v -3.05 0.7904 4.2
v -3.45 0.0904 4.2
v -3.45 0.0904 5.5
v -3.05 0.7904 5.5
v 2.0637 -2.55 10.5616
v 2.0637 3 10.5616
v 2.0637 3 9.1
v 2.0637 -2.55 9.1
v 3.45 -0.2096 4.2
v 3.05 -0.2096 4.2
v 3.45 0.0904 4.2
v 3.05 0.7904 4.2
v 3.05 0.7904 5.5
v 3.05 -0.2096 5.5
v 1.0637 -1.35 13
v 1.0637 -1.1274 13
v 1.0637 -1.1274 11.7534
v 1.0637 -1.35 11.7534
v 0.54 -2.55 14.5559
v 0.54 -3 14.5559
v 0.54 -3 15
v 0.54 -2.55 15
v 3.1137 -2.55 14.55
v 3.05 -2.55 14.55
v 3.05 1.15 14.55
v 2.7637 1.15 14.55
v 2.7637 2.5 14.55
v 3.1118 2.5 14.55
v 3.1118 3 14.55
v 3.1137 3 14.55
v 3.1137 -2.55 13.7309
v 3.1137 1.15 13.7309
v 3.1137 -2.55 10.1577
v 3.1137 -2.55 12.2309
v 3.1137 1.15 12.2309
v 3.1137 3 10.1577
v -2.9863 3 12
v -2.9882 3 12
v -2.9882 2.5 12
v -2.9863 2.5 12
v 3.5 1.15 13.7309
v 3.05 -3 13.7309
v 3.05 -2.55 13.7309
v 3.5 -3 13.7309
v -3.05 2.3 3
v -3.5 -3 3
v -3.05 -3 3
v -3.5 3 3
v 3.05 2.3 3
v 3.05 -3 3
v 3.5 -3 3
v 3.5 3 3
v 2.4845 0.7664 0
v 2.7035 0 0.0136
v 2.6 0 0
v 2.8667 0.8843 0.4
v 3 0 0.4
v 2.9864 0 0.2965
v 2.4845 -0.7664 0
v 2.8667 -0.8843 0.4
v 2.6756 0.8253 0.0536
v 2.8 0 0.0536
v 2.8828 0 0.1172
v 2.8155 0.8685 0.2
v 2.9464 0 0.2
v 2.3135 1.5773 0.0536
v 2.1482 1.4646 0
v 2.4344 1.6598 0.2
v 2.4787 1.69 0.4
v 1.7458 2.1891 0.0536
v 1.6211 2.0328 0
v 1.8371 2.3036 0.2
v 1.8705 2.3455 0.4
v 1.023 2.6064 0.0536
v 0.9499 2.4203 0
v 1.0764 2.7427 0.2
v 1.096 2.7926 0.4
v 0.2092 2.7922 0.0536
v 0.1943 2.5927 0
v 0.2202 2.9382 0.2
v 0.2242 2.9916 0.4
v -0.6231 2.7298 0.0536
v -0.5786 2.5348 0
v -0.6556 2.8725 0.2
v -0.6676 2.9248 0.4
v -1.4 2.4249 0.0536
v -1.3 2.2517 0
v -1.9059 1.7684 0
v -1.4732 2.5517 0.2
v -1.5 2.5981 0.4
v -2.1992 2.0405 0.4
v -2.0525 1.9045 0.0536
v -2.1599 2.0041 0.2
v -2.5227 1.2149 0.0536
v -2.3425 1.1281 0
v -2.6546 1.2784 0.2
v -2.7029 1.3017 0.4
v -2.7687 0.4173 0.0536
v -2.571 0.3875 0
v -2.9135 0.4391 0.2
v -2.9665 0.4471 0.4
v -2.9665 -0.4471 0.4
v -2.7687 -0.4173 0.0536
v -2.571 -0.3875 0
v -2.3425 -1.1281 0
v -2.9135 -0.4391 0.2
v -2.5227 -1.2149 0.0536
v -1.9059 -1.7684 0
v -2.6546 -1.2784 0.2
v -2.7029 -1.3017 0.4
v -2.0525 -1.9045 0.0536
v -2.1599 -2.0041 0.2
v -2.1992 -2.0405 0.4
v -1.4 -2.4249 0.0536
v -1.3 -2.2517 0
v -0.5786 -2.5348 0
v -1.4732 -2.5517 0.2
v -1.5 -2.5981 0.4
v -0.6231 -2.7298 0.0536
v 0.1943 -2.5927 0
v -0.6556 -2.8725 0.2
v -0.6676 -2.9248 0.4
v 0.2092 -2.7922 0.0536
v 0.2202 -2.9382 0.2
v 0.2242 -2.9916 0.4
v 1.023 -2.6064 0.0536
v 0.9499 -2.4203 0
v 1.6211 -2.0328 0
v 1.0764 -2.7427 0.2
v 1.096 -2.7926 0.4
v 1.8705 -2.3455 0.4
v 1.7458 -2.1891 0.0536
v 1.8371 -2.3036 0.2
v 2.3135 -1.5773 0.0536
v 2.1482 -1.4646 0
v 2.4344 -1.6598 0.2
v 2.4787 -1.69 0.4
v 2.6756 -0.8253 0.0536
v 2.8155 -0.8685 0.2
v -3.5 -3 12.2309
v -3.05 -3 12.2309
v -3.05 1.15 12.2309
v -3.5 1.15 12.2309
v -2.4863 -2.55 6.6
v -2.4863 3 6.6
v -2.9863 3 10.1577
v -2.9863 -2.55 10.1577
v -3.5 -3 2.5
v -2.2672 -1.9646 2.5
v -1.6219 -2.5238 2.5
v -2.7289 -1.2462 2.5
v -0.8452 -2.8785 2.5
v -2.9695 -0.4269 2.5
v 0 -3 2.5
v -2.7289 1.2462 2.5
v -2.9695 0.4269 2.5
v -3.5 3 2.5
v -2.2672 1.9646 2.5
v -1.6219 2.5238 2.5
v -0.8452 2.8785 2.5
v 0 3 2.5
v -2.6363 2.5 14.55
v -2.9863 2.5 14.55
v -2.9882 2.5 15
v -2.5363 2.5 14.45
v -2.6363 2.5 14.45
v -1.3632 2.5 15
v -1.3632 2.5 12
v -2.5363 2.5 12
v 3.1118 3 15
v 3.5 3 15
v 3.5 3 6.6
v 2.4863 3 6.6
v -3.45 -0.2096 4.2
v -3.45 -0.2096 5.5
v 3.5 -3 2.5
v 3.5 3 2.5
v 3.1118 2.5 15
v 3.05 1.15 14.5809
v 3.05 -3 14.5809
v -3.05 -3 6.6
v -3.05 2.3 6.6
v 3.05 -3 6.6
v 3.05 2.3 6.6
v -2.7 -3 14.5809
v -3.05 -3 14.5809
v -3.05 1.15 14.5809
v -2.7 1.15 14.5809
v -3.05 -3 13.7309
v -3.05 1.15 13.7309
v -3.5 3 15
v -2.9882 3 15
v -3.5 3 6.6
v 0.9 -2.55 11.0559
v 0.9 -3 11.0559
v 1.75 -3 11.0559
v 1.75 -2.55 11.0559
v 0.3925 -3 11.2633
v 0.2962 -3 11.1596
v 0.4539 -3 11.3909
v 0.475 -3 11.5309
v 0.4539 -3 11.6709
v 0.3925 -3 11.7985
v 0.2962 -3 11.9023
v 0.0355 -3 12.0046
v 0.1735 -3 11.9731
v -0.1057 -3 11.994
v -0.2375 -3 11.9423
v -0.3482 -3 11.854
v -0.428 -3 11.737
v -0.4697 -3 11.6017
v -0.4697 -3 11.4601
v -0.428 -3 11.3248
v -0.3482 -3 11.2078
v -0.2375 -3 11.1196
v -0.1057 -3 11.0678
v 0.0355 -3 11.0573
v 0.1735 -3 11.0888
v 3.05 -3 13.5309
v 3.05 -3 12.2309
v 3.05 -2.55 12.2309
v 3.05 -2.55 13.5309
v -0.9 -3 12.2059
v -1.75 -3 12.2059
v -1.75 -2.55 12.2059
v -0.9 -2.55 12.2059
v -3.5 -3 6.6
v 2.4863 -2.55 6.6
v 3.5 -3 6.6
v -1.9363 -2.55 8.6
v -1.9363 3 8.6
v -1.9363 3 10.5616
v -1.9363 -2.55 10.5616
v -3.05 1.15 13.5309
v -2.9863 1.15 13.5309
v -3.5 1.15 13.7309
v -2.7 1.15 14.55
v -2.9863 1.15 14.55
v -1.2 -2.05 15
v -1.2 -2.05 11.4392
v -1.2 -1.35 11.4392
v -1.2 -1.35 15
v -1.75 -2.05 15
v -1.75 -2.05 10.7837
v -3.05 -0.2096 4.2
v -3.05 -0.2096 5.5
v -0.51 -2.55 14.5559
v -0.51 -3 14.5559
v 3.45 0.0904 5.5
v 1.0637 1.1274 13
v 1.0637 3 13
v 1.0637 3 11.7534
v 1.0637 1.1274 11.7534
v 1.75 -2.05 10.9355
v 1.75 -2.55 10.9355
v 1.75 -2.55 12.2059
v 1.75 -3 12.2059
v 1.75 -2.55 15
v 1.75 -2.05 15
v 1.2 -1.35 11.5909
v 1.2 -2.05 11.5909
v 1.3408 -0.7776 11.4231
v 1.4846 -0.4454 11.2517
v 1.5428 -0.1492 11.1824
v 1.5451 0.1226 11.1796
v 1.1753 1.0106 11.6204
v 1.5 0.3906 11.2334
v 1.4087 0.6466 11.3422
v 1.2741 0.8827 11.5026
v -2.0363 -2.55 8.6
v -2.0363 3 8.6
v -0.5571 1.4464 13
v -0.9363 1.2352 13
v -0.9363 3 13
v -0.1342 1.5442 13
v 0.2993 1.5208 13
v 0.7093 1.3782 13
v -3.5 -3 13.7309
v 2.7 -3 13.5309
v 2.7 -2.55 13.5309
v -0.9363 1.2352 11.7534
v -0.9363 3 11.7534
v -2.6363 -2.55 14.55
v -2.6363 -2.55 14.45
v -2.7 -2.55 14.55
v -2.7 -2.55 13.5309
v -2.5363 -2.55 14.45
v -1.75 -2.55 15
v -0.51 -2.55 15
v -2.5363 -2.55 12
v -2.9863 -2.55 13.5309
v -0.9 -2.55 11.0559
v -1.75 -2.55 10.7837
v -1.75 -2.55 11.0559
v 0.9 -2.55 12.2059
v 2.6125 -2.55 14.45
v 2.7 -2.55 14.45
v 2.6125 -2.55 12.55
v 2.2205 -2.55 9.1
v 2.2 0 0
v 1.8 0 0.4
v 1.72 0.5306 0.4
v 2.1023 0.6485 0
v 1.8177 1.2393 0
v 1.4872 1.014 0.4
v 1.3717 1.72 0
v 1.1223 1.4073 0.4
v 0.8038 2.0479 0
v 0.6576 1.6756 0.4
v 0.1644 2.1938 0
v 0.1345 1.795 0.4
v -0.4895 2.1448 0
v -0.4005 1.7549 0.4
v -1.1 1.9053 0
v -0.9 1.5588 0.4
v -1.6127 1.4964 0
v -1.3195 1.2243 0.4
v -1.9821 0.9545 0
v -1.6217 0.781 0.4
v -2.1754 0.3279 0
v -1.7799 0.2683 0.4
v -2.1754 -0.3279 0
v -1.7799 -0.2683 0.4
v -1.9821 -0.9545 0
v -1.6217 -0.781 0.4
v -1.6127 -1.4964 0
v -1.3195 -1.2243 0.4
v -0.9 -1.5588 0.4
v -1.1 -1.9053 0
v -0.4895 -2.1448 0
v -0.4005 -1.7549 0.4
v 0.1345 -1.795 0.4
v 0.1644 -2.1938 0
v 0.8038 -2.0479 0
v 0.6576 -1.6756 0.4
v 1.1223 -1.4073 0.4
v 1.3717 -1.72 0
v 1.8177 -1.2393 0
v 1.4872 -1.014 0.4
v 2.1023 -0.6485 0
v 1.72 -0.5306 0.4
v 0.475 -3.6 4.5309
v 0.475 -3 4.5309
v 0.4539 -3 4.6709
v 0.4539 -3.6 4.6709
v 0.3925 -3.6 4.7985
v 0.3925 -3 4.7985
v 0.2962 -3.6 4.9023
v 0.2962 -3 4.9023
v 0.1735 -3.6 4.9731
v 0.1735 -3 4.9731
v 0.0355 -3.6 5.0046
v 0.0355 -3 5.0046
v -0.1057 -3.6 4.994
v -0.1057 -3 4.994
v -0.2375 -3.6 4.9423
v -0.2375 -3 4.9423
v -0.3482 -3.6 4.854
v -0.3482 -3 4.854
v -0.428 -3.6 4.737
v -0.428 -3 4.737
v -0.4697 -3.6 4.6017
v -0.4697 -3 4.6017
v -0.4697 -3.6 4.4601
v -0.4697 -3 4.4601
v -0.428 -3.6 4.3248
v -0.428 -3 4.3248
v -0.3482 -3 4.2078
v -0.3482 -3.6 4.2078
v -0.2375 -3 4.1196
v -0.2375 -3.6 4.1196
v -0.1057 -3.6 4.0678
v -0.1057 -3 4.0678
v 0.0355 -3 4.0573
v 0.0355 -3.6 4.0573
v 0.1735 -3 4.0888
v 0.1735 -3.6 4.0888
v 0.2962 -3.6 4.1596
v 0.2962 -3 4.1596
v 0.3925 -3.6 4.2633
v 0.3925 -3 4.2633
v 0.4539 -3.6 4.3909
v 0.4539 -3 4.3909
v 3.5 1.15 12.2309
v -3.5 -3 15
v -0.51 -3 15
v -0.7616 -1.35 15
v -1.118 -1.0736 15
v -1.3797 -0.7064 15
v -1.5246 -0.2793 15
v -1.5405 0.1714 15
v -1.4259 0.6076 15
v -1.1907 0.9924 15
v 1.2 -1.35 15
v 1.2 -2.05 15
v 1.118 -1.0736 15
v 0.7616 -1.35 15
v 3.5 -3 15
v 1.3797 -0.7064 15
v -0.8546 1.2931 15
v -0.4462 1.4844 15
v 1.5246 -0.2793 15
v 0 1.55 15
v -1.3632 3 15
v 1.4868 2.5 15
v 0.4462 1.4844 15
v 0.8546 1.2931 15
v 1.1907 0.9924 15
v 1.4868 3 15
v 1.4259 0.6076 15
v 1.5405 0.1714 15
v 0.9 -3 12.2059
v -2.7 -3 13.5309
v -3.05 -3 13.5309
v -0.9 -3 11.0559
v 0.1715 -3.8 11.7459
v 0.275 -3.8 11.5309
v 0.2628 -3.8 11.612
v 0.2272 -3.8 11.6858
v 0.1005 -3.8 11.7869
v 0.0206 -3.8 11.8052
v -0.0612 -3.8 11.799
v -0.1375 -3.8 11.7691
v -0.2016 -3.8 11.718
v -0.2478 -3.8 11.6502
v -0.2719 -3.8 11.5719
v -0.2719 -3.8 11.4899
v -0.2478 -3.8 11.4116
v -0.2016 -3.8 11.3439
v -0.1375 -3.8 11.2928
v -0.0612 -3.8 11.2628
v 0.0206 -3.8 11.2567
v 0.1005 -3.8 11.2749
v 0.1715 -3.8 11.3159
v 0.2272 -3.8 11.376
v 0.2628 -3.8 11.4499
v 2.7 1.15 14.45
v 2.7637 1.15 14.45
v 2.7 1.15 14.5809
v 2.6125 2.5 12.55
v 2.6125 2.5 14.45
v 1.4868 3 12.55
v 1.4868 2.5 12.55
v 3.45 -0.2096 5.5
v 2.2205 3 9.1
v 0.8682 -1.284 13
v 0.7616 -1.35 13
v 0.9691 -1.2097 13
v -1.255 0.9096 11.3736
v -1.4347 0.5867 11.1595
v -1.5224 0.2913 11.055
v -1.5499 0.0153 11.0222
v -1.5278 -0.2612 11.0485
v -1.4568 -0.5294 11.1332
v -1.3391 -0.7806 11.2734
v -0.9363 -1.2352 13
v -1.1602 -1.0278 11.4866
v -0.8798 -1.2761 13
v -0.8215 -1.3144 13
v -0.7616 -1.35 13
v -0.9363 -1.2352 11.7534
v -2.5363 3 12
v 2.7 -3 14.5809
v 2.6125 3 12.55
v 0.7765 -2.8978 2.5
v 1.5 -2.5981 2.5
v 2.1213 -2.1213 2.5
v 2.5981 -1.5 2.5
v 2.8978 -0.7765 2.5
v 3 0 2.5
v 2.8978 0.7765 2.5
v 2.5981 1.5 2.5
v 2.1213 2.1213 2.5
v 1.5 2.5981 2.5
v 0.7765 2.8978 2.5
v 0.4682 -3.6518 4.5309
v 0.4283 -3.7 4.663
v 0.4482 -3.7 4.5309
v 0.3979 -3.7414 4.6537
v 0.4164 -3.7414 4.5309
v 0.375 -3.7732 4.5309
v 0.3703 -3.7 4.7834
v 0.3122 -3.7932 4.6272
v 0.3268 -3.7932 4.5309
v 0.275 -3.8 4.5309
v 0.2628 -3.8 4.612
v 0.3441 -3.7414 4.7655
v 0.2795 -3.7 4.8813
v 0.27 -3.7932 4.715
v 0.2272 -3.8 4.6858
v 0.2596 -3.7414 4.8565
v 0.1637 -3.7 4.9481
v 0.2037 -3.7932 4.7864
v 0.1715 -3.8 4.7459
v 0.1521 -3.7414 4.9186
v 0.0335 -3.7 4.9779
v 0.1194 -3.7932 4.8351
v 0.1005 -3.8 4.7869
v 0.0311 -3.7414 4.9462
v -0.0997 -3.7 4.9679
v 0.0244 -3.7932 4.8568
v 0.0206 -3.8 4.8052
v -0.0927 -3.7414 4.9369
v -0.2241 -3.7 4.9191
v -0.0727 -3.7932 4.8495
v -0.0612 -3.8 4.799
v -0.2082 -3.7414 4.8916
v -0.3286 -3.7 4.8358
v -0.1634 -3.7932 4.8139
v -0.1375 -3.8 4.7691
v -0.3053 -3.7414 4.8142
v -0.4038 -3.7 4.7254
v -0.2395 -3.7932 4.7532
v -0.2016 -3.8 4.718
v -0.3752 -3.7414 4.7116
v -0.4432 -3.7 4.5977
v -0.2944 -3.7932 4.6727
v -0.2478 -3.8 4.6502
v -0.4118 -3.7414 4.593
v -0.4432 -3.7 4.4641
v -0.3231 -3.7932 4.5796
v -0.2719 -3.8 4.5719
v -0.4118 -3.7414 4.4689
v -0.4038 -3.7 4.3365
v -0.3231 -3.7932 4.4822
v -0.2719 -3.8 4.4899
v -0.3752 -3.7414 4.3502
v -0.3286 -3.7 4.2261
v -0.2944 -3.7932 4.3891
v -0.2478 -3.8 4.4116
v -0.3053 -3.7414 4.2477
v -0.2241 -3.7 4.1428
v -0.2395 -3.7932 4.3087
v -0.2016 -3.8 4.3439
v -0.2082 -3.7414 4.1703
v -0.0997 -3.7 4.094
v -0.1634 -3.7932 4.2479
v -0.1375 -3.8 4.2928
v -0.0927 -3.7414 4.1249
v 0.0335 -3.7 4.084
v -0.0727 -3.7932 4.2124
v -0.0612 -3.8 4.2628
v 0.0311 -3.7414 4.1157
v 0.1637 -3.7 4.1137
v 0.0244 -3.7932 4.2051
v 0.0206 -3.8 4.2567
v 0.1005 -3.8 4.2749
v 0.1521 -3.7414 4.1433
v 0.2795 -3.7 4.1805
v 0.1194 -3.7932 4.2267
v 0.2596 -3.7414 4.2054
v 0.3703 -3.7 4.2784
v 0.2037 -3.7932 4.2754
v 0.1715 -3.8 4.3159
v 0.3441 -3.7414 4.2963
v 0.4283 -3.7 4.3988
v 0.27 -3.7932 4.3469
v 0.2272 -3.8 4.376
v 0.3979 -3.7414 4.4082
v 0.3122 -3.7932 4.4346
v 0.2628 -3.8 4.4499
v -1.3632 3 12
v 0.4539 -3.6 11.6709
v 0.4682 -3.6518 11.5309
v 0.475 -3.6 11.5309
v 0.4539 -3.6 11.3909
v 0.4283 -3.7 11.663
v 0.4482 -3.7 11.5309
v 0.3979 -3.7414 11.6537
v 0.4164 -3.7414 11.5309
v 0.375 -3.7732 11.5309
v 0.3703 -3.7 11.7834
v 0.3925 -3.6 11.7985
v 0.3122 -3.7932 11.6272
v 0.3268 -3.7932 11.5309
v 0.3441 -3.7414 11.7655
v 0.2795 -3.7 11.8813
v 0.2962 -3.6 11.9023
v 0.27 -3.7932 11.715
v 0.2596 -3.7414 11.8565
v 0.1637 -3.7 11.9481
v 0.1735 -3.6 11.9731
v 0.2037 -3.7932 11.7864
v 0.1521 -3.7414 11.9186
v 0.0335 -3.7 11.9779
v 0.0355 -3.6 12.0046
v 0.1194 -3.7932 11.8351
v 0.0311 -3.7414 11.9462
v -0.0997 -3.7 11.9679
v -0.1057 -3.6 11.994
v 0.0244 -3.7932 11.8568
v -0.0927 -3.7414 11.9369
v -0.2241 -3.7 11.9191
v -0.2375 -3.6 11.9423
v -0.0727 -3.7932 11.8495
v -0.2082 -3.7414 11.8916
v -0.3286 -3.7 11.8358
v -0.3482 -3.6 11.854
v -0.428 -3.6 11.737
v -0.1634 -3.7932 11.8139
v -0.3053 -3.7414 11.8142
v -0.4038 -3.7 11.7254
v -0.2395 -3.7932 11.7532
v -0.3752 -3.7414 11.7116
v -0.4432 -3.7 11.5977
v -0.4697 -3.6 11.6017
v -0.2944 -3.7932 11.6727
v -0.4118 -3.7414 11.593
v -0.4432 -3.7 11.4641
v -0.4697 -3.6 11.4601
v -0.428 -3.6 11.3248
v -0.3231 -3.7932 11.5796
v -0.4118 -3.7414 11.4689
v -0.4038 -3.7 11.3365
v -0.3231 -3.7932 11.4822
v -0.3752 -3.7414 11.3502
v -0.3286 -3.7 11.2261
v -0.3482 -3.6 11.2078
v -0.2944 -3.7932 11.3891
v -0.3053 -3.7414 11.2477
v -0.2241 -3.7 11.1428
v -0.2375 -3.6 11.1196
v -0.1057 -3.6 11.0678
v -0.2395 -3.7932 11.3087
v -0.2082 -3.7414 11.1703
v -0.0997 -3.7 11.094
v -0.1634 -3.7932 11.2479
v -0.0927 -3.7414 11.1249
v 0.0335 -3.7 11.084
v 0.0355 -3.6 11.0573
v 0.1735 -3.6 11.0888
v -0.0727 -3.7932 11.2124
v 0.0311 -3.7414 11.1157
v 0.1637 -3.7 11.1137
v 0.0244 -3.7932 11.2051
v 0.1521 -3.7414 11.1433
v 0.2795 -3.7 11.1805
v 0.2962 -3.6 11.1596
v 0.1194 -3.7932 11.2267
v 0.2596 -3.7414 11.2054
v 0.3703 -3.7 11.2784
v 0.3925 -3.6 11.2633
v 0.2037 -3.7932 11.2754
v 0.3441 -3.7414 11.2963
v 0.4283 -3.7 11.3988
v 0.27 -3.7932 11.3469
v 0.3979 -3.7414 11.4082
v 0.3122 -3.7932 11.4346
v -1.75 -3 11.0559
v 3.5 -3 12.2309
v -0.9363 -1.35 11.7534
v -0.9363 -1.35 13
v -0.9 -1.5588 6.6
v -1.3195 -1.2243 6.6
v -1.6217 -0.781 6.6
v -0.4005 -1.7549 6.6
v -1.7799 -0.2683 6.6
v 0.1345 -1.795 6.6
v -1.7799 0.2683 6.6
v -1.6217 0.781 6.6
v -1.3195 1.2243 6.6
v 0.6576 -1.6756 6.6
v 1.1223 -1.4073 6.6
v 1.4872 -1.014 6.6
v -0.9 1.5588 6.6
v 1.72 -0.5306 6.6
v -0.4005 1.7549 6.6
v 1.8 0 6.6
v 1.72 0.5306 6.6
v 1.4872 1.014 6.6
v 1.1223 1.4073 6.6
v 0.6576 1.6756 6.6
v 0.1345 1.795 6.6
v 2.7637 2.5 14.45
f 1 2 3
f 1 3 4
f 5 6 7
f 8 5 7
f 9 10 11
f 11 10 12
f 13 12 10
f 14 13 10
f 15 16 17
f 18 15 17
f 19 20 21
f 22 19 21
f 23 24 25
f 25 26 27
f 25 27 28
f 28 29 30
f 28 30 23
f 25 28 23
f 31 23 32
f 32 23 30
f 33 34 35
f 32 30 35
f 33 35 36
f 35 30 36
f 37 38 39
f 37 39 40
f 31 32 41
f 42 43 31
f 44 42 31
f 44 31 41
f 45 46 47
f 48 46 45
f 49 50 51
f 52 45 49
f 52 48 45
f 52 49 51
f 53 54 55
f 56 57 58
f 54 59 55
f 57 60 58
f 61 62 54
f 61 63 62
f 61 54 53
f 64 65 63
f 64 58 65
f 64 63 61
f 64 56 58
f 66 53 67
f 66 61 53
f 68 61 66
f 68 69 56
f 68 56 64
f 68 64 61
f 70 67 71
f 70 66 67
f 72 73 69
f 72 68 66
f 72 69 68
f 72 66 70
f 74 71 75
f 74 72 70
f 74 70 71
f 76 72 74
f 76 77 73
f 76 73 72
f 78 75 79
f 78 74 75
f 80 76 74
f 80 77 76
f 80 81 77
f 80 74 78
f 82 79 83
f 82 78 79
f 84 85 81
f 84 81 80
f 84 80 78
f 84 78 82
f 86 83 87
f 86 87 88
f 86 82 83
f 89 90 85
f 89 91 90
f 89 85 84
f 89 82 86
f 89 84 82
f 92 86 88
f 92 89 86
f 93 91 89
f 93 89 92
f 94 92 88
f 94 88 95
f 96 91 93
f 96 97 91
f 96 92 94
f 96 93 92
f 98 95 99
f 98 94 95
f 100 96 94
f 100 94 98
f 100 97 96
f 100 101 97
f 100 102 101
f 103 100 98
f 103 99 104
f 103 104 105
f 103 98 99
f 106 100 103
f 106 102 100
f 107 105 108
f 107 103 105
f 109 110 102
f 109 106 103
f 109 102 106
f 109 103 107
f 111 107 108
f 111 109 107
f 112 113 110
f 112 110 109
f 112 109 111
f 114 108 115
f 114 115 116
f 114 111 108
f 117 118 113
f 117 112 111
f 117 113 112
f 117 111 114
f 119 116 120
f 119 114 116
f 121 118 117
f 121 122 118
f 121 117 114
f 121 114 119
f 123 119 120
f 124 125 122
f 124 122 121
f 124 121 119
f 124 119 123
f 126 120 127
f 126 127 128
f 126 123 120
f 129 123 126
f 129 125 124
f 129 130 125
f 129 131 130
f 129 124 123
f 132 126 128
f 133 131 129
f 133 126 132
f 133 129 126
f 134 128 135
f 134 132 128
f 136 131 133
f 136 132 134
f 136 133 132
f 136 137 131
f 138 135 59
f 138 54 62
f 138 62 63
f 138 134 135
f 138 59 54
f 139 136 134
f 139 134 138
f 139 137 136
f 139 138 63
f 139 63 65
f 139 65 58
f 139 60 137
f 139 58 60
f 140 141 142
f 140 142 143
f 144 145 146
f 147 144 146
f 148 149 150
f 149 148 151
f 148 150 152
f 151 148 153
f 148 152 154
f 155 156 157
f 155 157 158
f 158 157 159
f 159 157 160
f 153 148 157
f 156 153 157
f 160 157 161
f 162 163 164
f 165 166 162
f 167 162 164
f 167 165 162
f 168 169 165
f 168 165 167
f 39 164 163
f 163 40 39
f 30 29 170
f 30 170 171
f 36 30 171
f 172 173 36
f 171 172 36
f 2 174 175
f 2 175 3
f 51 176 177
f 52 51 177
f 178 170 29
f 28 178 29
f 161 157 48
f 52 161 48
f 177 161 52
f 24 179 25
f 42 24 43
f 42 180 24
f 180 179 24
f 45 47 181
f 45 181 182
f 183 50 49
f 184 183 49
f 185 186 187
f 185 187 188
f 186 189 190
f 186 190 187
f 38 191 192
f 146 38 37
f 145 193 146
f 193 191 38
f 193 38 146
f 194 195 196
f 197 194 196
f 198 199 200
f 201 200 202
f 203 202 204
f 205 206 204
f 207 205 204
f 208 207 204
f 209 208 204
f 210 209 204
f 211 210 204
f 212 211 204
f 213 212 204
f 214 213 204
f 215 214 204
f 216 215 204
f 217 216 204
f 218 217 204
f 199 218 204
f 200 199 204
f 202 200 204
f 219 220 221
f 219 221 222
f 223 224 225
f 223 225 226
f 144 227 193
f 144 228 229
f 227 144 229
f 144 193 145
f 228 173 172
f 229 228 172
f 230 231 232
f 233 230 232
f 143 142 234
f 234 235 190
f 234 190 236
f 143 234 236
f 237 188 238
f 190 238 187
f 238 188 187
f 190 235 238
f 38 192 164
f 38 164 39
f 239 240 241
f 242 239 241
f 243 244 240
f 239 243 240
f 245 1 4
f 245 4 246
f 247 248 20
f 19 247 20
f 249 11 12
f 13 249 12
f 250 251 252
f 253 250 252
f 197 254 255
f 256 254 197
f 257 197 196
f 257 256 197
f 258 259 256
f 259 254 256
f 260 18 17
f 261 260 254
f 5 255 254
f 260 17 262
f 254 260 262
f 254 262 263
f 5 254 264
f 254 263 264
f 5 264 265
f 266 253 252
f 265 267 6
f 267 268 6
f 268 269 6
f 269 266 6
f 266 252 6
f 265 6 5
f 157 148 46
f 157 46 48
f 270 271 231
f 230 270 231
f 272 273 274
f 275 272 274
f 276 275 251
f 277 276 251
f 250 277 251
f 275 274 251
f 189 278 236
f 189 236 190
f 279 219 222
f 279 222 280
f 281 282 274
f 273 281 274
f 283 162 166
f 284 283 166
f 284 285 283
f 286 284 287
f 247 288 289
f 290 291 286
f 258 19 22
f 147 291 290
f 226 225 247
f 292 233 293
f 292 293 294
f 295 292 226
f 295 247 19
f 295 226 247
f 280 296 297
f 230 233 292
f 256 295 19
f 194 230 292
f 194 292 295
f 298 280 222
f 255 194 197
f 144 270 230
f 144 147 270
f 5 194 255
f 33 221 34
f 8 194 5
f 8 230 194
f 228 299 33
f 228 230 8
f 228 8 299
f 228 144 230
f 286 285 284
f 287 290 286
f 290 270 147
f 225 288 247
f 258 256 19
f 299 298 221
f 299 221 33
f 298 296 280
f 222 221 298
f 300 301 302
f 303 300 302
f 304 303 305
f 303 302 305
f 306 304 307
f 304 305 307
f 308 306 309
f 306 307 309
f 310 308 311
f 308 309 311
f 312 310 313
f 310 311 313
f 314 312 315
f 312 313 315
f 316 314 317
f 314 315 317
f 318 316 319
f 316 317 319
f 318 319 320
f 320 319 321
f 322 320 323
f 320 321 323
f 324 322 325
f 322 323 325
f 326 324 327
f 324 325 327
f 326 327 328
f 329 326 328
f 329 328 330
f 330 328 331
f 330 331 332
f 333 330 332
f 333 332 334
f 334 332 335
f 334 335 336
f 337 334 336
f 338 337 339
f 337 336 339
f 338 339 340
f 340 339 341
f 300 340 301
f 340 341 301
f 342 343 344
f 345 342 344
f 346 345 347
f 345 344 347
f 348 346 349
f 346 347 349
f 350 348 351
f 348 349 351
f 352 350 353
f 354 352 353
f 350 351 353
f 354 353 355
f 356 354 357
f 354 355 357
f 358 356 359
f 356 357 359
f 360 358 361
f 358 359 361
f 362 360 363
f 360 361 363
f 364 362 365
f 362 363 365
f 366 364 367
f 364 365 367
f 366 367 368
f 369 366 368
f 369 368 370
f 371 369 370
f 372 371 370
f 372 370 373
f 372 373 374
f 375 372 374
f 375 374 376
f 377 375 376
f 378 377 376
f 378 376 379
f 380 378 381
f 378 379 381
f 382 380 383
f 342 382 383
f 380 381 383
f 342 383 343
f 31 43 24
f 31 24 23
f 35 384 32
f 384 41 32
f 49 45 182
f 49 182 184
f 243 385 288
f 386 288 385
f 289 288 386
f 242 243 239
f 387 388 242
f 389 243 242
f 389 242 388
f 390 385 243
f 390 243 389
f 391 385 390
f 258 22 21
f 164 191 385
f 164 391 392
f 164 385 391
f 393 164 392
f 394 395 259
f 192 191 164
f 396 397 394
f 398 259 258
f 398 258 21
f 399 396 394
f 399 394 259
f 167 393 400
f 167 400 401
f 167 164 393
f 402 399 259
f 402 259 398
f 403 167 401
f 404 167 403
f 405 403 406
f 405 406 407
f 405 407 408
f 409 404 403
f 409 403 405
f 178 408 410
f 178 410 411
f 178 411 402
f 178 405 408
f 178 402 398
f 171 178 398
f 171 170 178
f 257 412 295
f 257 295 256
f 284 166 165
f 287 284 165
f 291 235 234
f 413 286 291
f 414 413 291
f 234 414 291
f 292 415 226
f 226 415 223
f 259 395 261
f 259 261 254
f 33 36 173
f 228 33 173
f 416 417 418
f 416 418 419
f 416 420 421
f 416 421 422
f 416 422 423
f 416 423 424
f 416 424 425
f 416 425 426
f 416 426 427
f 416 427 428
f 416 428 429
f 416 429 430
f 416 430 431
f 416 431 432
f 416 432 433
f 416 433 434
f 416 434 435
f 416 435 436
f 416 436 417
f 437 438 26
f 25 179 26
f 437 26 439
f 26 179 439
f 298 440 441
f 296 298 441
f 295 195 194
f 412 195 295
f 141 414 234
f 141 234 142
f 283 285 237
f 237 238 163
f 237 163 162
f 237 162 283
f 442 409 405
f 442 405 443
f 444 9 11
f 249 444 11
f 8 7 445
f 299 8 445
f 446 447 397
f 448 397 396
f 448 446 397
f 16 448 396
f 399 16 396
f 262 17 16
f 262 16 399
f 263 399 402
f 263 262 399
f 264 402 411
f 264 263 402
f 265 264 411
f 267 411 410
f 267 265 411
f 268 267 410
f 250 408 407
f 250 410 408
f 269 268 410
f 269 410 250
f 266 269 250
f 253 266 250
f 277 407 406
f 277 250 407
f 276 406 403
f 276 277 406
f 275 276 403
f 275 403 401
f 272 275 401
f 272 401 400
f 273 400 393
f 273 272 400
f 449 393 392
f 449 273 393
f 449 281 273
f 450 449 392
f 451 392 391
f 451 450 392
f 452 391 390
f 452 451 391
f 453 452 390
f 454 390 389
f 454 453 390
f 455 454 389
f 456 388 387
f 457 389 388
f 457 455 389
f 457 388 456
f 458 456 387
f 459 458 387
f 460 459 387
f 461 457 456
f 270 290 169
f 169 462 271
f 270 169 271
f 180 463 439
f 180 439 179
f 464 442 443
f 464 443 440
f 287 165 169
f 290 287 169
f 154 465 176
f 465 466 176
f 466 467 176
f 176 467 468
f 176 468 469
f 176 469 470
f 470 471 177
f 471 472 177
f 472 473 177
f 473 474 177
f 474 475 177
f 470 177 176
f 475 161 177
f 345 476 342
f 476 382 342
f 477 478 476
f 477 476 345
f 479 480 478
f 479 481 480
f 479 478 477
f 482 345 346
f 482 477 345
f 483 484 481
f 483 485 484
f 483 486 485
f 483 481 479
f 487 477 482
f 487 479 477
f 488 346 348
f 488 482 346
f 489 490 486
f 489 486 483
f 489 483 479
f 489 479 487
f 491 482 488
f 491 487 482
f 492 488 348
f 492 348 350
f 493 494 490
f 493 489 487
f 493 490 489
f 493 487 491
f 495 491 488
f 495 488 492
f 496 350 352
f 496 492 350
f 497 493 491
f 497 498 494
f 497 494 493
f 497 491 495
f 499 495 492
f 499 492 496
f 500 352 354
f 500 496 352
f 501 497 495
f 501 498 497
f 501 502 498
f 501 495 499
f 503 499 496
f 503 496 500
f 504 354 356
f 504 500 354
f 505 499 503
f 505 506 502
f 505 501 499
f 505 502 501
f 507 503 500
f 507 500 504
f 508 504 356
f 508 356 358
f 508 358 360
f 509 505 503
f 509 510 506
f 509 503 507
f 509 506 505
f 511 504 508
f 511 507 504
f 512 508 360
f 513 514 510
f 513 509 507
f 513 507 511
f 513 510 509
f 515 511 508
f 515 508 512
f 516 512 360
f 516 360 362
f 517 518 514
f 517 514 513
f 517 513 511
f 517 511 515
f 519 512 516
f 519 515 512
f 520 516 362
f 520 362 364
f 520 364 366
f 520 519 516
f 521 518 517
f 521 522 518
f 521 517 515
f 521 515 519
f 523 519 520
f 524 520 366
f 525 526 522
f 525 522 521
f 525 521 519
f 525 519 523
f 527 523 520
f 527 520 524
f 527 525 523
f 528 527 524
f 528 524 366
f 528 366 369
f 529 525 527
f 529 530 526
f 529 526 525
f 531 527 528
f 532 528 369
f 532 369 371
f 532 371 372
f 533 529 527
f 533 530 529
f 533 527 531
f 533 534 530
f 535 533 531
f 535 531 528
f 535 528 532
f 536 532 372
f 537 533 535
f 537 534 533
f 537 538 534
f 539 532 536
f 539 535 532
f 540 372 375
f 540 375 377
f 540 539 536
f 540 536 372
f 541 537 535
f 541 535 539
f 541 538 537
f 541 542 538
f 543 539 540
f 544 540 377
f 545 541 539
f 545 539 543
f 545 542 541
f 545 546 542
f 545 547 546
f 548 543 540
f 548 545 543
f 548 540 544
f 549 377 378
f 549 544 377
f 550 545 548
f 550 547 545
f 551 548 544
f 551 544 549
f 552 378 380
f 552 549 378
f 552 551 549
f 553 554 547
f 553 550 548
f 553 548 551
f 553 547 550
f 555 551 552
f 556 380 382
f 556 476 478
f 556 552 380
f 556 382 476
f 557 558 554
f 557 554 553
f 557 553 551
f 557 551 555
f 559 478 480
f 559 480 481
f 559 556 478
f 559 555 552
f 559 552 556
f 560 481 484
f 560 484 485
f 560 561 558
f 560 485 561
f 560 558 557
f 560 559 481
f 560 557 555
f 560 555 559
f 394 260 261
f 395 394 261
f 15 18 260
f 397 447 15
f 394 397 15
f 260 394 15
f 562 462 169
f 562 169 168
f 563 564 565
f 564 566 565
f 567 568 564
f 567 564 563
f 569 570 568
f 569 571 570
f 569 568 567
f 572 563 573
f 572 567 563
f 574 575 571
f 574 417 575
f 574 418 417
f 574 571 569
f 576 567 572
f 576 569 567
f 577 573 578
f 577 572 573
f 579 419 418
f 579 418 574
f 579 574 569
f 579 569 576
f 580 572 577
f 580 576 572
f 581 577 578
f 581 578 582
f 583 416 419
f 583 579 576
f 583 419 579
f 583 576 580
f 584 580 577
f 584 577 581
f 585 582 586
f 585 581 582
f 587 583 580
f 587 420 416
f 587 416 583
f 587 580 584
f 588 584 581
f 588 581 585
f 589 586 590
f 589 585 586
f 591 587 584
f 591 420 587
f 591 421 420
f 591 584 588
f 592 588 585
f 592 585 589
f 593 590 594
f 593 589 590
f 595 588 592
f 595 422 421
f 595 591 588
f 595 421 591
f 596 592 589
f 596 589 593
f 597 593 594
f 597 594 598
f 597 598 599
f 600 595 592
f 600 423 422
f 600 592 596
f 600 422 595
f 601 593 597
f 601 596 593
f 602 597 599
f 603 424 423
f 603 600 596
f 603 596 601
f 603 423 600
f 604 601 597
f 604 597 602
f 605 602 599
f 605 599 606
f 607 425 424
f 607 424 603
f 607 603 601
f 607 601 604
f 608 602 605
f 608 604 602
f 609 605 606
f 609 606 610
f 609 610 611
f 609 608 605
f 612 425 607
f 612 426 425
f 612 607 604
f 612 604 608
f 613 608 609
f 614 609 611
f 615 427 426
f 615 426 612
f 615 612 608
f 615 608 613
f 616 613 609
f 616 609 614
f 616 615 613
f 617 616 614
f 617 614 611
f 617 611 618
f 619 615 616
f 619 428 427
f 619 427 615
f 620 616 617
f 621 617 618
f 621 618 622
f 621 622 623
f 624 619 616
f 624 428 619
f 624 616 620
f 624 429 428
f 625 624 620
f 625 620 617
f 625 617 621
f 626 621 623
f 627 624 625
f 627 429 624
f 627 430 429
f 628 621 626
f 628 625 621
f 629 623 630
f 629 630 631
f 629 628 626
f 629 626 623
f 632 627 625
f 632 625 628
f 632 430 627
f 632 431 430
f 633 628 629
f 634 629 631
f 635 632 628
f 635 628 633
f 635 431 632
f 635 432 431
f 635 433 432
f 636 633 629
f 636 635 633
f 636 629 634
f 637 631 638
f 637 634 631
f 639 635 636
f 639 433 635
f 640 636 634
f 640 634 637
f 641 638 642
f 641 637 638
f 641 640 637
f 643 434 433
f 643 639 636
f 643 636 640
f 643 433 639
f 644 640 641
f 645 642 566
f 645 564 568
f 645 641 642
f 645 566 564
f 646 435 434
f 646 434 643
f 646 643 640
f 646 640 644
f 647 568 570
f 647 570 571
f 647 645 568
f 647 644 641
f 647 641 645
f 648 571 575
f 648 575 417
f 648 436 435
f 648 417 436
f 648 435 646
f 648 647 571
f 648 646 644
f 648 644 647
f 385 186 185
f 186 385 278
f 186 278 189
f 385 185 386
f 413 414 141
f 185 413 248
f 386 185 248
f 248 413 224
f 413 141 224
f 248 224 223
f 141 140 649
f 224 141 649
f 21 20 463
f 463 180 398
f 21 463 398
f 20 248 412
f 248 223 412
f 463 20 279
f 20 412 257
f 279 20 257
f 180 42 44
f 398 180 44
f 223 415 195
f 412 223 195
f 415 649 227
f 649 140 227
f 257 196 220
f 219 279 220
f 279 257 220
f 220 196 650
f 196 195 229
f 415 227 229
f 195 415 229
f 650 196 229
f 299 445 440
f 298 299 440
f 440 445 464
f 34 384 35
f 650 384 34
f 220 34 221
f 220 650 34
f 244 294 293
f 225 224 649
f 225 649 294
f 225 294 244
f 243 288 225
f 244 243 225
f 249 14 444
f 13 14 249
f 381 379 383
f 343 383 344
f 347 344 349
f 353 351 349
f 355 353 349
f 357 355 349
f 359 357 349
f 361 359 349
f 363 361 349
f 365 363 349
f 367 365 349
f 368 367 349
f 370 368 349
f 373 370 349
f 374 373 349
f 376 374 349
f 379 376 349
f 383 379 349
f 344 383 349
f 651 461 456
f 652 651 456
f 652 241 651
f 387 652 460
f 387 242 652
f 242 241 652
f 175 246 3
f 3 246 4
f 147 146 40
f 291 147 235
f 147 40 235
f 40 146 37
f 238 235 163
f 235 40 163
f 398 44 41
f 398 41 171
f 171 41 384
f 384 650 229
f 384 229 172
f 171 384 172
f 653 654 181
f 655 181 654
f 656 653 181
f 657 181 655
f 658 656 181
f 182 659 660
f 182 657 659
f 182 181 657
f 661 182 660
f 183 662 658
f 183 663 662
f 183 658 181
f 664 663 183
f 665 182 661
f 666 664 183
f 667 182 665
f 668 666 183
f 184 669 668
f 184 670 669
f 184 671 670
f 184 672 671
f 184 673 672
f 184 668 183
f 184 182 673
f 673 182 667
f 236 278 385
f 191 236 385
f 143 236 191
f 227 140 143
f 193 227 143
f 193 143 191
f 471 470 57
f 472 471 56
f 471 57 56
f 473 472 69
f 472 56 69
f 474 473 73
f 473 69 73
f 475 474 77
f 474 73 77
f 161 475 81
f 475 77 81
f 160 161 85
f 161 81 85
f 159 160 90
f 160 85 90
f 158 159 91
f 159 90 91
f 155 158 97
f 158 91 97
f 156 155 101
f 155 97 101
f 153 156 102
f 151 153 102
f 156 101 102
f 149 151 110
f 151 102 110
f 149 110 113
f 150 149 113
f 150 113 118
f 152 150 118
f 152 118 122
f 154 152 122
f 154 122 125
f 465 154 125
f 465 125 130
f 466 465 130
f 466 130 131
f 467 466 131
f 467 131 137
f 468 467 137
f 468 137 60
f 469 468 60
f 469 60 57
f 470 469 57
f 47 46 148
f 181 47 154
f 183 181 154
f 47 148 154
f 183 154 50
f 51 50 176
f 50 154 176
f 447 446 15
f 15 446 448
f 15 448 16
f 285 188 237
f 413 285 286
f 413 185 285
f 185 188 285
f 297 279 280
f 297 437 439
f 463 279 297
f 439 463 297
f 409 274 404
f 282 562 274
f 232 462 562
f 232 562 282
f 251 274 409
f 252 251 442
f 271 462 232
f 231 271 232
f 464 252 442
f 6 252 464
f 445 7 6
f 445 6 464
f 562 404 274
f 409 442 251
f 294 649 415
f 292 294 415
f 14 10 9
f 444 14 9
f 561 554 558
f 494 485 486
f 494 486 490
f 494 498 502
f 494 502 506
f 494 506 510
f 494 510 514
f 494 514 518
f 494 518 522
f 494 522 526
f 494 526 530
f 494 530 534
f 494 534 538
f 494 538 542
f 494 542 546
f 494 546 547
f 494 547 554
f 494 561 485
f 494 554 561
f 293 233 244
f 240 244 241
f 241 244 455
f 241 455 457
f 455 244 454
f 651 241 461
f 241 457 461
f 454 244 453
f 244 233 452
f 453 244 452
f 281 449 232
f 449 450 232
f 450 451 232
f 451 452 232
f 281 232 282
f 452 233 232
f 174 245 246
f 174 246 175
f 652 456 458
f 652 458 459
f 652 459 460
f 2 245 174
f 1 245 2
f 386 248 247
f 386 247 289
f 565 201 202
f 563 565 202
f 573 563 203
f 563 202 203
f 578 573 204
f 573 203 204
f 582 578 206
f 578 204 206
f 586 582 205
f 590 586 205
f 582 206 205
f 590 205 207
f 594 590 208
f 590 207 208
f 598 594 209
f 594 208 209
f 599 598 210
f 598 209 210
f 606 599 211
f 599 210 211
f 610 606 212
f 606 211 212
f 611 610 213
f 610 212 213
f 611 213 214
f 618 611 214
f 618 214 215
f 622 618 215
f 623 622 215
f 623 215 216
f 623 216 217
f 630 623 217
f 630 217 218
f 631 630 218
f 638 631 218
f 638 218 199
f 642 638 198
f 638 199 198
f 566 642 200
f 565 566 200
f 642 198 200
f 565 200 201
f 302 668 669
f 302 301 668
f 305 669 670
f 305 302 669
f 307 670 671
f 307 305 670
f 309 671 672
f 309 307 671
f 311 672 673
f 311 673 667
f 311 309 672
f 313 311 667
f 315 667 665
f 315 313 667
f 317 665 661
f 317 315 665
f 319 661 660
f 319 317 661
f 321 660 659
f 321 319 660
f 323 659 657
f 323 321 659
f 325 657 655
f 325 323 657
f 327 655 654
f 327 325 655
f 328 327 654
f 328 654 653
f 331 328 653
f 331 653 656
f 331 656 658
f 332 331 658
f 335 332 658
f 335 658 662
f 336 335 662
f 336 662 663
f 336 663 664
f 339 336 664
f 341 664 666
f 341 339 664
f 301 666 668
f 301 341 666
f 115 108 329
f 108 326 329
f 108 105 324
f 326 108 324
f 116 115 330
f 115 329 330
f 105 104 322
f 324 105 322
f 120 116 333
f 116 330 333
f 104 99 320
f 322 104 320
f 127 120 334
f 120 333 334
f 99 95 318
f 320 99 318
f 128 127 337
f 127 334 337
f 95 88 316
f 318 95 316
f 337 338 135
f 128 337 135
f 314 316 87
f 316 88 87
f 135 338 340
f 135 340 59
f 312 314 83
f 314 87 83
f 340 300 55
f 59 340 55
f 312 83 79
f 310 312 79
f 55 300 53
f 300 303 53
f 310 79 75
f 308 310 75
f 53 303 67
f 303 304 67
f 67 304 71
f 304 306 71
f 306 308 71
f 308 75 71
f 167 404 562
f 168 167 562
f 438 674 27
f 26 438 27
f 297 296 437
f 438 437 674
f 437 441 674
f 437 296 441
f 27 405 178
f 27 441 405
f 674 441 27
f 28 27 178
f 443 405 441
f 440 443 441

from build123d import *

# Parameters (mm, degrees)
SZKIC1_R                      = 3
SZKIC1_R_2                    = 1.8
DODANIE_WYCI_GNI_CIE1_DEPTH   = 2.5
SZKIC2_W                      = 7
SZKIC2_H                      = 6
SZKIC2_R                      = 1.8
DODANIE_WYCI_GNI_CIE2_DEPTH   = 0.5
ZAOKR_GLENIE1_R               = 0.4
SFAZOWANIE1_SIZE              = 0.4
SZKIC3_W                      = 6.1
SZKIC3_H                      = 5.3
SZKIC3_R                      = 1.8
DODANIE_WYCI_GNI_CIE3_DEPTH   = 3.6
DODANIE_WYCI_GNI_CIE4_START   = -0.1
DODANIE_WYCI_GNI_CIE4_DEPTH   = 1.3
SZKIC5_W                      = 7
SZKIC5_H                      = 6
SZKIC5_R                      = 1.55
DODANIE_WYCI_GNI_CIE5_DEPTH   = 8.4
SZKIC8_R                      = 0.475
DODANIE_WYCI_GNI_CIE6_DEPTH   = 0.8
DODANIE_WYCI_GNI_CIE6_2_DEPTH = 0.8
ZAOKR_GLENIE2_R               = 0.2
ZAOKR_GLENIE3_R               = 0.2
SZKIC9_W                      = 0.85
SZKIC9_H                      = 1.15
WYTNIJ_WYCI_GNI_CIE1_DEPTH    = 0.95
SZKIC10_W                     = 1.05
SZKIC10_H                     = 0.475
WYTNIJ_WYCI_GNI_CIE2_DEPTH    = 2
WYTNIJ_WYCI_GNI_CIE3_DEPTH    = 4.15
WYTNIJ_WYCI_GNI_CIE4_DEPTH    = 8.4
WYTNIJ_WYCI_GNI_CIE5_DEPTH    = 5.55
SZKIC14_W                     = 1.625
SZKIC14_H                     = 2.45
SZKIC14_H_2                   = 3
WYTNIJ_WYCI_GNI_CIE6_DEPTH    = 0.5


with BuildPart() as part:
    # Szkic1 → Dodanie-wyciągnięcie1 (new body)
    with BuildSketch(Plane.XY):
        Circle(SZKIC1_R)
        Circle(SZKIC1_R_2, mode=Mode.SUBTRACT)
    extrude(amount=DODANIE_WYCI_GNI_CIE1_DEPTH)

    # Szkic2 → Dodanie-wyciągnięcie2 (add)
    with BuildSketch(Plane.XY.offset(2.5)):
        Rectangle(SZKIC2_W, SZKIC2_H)
        Circle(SZKIC2_R, mode=Mode.SUBTRACT)
    extrude(amount=DODANIE_WYCI_GNI_CIE2_DEPTH)

    # Zaokrąglenie1
    zaokr_glenie1_edges = [part.edges().sort_by_distance(p)[0] for p in [
        (-3, 0, 0),
    ]]
    fillet(zaokr_glenie1_edges, radius=ZAOKR_GLENIE1_R)

    # Sfazowanie1
    sfazowanie1_edges = [part.edges().sort_by_distance(p)[0] for p in [
        (-1.8, 0, 0),
    ]]
    chamfer(sfazowanie1_edges, length=SFAZOWANIE1_SIZE)

    # Szkic3 → Dodanie-wyciągnięcie3 (add)
    with BuildSketch(Plane.XY.offset(3)):
        with Locations((0, -0.35)):
            Rectangle(SZKIC3_W, SZKIC3_H)
        Circle(SZKIC3_R, mode=Mode.SUBTRACT)
    extrude(amount=DODANIE_WYCI_GNI_CIE3_DEPTH)


with BuildPart() as body_2:
    # Szkic4 → Dodanie-wyciągnięcie4 (new body)
    with BuildSketch(Plane.XY.offset(4.3).offset(DODANIE_WYCI_GNI_CIE4_START)):
        Polygon((3.05, 0.790431876), (3.05, -0.209568124), (3.45, -0.209568124), (3.45, 0.090431876), align=None)
    extrude(amount=DODANIE_WYCI_GNI_CIE4_DEPTH)


with BuildPart() as body_3:
    # Lustro1: mirrored copy
    add(body_2.part.mirror(Plane(origin=(0, 0, 0), x_dir=(0, 0, 1), z_dir=(1, 0, 0))))


with BuildPart() as body_4:
    # Szkic5 → Dodanie-wyciągnięcie5 (new body)
    with BuildSketch(Plane.XY.offset(6.6)):
        Rectangle(SZKIC5_W, SZKIC5_H)
        Circle(SZKIC5_R, mode=Mode.SUBTRACT)
    extrude(amount=DODANIE_WYCI_GNI_CIE5_DEPTH)

    # Szkic9 → Wytnij-wyciągnięcie1 (cut)
    with BuildSketch(Plane.XZ.offset(3)):
        with Locations((1.325, 11.630923267)):
            Rectangle(SZKIC9_W, SZKIC9_H)
        with Locations((-1.325, 11.630923267)):
            Rectangle(SZKIC9_W, SZKIC9_H)
    extrude(amount=-WYTNIJ_WYCI_GNI_CIE1_DEPTH, mode=Mode.SUBTRACT)

    # Szkic10 → Wytnij-wyciągnięcie2 (cut)
    with BuildSketch(Plane.XZ.offset(3)):
        with Locations((0.015, 14.793423267)):
            Rectangle(SZKIC10_W, SZKIC10_H)
    extrude(amount=-WYTNIJ_WYCI_GNI_CIE2_DEPTH, mode=Mode.SUBTRACT)

    # Szkic11 → Wytnij-wyciągnięcie3 (cut)
    with BuildSketch(Plane.XZ.offset(3)):
        Polygon((3.05, 13.530923267), (2.7, 13.530923267), (2.7, 14.580923267), (3.05, 14.580923267), (3.05, 13.730923267), (3.5, 13.730923267), (3.5, 12.230923267), (3.05, 12.230923267), align=None)
        Polygon((-3.05, 13.530923267), (-3.05, 12.230923267), (-3.5, 12.230923267), (-3.5, 13.730923267), (-3.05, 13.730923267), (-3.05, 14.580923267), (-2.7, 14.580923267), (-2.7, 13.530923267), align=None)
    extrude(amount=-WYTNIJ_WYCI_GNI_CIE3_DEPTH, mode=Mode.SUBTRACT)

    # Szkic12 → Wytnij-wyciągnięcie4 (cut)
    with BuildSketch(Plane.XY.offset(15)):
        with BuildLine():
            Line((1.75, -2.05), (1.75, -2.55))
            Line((1.75, -2.55), (0.54, -2.55))
            Line((0.54, -2.55), (-0.51, -2.55))
            Line((-0.51, -2.55), (-1.75, -2.55))
            Line((-1.75, -2.55), (-1.75, -2.05))
            Line((-1.75, -2.05), (-1.2, -2.05))
            Line((-1.2, -2.05), (-1.2, -1.35))
            Line((-1.2, -1.35), (-0.761577311, -1.35))
            ThreePointArc((-0.761577311, -1.35), (0, 1.55), (0.761577311, -1.35))
            Line((0.761577311, -1.35), (1.2, -1.35))
            Line((1.2, -1.35), (1.2, -2.05))
            Line((1.2, -2.05), (1.75, -2.05))
        make_face()
    extrude(amount=-WYTNIJ_WYCI_GNI_CIE4_DEPTH, mode=Mode.SUBTRACT)

    # Szkic13 → Wytnij-wyciągnięcie5 (cut)
    with BuildSketch(Plane(origin=(0, 3, 0), x_dir=(1, 0, 0), z_dir=(0, 1, 0))):
        Polygon((-2.486342085, -6.6), (-2.986342085, -10.157684861), (-2.986342085, -14.55), (-2.636342085, -14.55), (-2.636342085, -14.45), (-2.536342085, -14.45), (-2.536342085, -12), (-2.036342085, -8.6), (-1.936342085, -8.6), (-1.936342085, -10.561649281), (-0.936342085, -11.753402874), (-0.936342085, -13), (1.063657915, -13), (1.063657915, -11.753402874), (2.063657915, -10.561649281), (2.063657915, -9.1), (2.220476097, -9.1), (2.612521551, -12.55), (2.612521551, -14.45), (2.763657915, -14.45), (2.763657915, -14.55), (3.113657915, -14.55), (3.113657915, -10.157684861), (2.486342085, -6.6), align=None)
    extrude(amount=-WYTNIJ_WYCI_GNI_CIE5_DEPTH, mode=Mode.SUBTRACT)

    # Szkic14 → Wytnij-wyciągnięcie6 (cut)
    with BuildSketch(Plane(origin=(0, 3, 0), x_dir=(1, 0, 0), z_dir=(0, 1, 0))):
        with Locations((2.299282609, -13.775)):
            Rectangle(SZKIC14_W, SZKIC14_H)
        with Locations((-2.175717391, -13.5)):
            Rectangle(SZKIC14_W, SZKIC14_H_2)
    extrude(amount=-WYTNIJ_WYCI_GNI_CIE6_DEPTH, mode=Mode.SUBTRACT)


with BuildPart() as body_5:
    # Szkic8 → Dodanie-wyciągnięcie6 (new body)
    with BuildSketch(Plane.XZ.offset(3)):
        with Locations((0, 11.530923267)):
            Circle(SZKIC8_R)
    extrude(amount=DODANIE_WYCI_GNI_CIE6_DEPTH)

    # Zaokrąglenie3
    zaokr_glenie3_edges = [body_5.edges().sort_by_distance(p)[0] for p in [
        (-0.475, -3.8, 11.530923267),
    ]]
    fillet(zaokr_glenie3_edges, radius=ZAOKR_GLENIE3_R)


with BuildPart() as body_6:
    # Szkic8 → Dodanie-wyci_gni_cie6 2 (new body)
    with BuildSketch(Plane.XZ.offset(3)):
        with Locations((0, 4.530923267)):
            Circle(SZKIC8_R)
    extrude(amount=DODANIE_WYCI_GNI_CIE6_2_DEPTH)

    # Zaokrąglenie2
    zaokr_glenie2_edges = [body_6.edges().sort_by_distance(p)[0] for p in [
        (-0.475, -3.8, 4.530923267),
    ]]
    fillet(zaokr_glenie2_edges, radius=ZAOKR_GLENIE2_R)


solid = Compound([part.part, body_2.part, body_3.part, body_4.part, body_5.part, body_6.part])
